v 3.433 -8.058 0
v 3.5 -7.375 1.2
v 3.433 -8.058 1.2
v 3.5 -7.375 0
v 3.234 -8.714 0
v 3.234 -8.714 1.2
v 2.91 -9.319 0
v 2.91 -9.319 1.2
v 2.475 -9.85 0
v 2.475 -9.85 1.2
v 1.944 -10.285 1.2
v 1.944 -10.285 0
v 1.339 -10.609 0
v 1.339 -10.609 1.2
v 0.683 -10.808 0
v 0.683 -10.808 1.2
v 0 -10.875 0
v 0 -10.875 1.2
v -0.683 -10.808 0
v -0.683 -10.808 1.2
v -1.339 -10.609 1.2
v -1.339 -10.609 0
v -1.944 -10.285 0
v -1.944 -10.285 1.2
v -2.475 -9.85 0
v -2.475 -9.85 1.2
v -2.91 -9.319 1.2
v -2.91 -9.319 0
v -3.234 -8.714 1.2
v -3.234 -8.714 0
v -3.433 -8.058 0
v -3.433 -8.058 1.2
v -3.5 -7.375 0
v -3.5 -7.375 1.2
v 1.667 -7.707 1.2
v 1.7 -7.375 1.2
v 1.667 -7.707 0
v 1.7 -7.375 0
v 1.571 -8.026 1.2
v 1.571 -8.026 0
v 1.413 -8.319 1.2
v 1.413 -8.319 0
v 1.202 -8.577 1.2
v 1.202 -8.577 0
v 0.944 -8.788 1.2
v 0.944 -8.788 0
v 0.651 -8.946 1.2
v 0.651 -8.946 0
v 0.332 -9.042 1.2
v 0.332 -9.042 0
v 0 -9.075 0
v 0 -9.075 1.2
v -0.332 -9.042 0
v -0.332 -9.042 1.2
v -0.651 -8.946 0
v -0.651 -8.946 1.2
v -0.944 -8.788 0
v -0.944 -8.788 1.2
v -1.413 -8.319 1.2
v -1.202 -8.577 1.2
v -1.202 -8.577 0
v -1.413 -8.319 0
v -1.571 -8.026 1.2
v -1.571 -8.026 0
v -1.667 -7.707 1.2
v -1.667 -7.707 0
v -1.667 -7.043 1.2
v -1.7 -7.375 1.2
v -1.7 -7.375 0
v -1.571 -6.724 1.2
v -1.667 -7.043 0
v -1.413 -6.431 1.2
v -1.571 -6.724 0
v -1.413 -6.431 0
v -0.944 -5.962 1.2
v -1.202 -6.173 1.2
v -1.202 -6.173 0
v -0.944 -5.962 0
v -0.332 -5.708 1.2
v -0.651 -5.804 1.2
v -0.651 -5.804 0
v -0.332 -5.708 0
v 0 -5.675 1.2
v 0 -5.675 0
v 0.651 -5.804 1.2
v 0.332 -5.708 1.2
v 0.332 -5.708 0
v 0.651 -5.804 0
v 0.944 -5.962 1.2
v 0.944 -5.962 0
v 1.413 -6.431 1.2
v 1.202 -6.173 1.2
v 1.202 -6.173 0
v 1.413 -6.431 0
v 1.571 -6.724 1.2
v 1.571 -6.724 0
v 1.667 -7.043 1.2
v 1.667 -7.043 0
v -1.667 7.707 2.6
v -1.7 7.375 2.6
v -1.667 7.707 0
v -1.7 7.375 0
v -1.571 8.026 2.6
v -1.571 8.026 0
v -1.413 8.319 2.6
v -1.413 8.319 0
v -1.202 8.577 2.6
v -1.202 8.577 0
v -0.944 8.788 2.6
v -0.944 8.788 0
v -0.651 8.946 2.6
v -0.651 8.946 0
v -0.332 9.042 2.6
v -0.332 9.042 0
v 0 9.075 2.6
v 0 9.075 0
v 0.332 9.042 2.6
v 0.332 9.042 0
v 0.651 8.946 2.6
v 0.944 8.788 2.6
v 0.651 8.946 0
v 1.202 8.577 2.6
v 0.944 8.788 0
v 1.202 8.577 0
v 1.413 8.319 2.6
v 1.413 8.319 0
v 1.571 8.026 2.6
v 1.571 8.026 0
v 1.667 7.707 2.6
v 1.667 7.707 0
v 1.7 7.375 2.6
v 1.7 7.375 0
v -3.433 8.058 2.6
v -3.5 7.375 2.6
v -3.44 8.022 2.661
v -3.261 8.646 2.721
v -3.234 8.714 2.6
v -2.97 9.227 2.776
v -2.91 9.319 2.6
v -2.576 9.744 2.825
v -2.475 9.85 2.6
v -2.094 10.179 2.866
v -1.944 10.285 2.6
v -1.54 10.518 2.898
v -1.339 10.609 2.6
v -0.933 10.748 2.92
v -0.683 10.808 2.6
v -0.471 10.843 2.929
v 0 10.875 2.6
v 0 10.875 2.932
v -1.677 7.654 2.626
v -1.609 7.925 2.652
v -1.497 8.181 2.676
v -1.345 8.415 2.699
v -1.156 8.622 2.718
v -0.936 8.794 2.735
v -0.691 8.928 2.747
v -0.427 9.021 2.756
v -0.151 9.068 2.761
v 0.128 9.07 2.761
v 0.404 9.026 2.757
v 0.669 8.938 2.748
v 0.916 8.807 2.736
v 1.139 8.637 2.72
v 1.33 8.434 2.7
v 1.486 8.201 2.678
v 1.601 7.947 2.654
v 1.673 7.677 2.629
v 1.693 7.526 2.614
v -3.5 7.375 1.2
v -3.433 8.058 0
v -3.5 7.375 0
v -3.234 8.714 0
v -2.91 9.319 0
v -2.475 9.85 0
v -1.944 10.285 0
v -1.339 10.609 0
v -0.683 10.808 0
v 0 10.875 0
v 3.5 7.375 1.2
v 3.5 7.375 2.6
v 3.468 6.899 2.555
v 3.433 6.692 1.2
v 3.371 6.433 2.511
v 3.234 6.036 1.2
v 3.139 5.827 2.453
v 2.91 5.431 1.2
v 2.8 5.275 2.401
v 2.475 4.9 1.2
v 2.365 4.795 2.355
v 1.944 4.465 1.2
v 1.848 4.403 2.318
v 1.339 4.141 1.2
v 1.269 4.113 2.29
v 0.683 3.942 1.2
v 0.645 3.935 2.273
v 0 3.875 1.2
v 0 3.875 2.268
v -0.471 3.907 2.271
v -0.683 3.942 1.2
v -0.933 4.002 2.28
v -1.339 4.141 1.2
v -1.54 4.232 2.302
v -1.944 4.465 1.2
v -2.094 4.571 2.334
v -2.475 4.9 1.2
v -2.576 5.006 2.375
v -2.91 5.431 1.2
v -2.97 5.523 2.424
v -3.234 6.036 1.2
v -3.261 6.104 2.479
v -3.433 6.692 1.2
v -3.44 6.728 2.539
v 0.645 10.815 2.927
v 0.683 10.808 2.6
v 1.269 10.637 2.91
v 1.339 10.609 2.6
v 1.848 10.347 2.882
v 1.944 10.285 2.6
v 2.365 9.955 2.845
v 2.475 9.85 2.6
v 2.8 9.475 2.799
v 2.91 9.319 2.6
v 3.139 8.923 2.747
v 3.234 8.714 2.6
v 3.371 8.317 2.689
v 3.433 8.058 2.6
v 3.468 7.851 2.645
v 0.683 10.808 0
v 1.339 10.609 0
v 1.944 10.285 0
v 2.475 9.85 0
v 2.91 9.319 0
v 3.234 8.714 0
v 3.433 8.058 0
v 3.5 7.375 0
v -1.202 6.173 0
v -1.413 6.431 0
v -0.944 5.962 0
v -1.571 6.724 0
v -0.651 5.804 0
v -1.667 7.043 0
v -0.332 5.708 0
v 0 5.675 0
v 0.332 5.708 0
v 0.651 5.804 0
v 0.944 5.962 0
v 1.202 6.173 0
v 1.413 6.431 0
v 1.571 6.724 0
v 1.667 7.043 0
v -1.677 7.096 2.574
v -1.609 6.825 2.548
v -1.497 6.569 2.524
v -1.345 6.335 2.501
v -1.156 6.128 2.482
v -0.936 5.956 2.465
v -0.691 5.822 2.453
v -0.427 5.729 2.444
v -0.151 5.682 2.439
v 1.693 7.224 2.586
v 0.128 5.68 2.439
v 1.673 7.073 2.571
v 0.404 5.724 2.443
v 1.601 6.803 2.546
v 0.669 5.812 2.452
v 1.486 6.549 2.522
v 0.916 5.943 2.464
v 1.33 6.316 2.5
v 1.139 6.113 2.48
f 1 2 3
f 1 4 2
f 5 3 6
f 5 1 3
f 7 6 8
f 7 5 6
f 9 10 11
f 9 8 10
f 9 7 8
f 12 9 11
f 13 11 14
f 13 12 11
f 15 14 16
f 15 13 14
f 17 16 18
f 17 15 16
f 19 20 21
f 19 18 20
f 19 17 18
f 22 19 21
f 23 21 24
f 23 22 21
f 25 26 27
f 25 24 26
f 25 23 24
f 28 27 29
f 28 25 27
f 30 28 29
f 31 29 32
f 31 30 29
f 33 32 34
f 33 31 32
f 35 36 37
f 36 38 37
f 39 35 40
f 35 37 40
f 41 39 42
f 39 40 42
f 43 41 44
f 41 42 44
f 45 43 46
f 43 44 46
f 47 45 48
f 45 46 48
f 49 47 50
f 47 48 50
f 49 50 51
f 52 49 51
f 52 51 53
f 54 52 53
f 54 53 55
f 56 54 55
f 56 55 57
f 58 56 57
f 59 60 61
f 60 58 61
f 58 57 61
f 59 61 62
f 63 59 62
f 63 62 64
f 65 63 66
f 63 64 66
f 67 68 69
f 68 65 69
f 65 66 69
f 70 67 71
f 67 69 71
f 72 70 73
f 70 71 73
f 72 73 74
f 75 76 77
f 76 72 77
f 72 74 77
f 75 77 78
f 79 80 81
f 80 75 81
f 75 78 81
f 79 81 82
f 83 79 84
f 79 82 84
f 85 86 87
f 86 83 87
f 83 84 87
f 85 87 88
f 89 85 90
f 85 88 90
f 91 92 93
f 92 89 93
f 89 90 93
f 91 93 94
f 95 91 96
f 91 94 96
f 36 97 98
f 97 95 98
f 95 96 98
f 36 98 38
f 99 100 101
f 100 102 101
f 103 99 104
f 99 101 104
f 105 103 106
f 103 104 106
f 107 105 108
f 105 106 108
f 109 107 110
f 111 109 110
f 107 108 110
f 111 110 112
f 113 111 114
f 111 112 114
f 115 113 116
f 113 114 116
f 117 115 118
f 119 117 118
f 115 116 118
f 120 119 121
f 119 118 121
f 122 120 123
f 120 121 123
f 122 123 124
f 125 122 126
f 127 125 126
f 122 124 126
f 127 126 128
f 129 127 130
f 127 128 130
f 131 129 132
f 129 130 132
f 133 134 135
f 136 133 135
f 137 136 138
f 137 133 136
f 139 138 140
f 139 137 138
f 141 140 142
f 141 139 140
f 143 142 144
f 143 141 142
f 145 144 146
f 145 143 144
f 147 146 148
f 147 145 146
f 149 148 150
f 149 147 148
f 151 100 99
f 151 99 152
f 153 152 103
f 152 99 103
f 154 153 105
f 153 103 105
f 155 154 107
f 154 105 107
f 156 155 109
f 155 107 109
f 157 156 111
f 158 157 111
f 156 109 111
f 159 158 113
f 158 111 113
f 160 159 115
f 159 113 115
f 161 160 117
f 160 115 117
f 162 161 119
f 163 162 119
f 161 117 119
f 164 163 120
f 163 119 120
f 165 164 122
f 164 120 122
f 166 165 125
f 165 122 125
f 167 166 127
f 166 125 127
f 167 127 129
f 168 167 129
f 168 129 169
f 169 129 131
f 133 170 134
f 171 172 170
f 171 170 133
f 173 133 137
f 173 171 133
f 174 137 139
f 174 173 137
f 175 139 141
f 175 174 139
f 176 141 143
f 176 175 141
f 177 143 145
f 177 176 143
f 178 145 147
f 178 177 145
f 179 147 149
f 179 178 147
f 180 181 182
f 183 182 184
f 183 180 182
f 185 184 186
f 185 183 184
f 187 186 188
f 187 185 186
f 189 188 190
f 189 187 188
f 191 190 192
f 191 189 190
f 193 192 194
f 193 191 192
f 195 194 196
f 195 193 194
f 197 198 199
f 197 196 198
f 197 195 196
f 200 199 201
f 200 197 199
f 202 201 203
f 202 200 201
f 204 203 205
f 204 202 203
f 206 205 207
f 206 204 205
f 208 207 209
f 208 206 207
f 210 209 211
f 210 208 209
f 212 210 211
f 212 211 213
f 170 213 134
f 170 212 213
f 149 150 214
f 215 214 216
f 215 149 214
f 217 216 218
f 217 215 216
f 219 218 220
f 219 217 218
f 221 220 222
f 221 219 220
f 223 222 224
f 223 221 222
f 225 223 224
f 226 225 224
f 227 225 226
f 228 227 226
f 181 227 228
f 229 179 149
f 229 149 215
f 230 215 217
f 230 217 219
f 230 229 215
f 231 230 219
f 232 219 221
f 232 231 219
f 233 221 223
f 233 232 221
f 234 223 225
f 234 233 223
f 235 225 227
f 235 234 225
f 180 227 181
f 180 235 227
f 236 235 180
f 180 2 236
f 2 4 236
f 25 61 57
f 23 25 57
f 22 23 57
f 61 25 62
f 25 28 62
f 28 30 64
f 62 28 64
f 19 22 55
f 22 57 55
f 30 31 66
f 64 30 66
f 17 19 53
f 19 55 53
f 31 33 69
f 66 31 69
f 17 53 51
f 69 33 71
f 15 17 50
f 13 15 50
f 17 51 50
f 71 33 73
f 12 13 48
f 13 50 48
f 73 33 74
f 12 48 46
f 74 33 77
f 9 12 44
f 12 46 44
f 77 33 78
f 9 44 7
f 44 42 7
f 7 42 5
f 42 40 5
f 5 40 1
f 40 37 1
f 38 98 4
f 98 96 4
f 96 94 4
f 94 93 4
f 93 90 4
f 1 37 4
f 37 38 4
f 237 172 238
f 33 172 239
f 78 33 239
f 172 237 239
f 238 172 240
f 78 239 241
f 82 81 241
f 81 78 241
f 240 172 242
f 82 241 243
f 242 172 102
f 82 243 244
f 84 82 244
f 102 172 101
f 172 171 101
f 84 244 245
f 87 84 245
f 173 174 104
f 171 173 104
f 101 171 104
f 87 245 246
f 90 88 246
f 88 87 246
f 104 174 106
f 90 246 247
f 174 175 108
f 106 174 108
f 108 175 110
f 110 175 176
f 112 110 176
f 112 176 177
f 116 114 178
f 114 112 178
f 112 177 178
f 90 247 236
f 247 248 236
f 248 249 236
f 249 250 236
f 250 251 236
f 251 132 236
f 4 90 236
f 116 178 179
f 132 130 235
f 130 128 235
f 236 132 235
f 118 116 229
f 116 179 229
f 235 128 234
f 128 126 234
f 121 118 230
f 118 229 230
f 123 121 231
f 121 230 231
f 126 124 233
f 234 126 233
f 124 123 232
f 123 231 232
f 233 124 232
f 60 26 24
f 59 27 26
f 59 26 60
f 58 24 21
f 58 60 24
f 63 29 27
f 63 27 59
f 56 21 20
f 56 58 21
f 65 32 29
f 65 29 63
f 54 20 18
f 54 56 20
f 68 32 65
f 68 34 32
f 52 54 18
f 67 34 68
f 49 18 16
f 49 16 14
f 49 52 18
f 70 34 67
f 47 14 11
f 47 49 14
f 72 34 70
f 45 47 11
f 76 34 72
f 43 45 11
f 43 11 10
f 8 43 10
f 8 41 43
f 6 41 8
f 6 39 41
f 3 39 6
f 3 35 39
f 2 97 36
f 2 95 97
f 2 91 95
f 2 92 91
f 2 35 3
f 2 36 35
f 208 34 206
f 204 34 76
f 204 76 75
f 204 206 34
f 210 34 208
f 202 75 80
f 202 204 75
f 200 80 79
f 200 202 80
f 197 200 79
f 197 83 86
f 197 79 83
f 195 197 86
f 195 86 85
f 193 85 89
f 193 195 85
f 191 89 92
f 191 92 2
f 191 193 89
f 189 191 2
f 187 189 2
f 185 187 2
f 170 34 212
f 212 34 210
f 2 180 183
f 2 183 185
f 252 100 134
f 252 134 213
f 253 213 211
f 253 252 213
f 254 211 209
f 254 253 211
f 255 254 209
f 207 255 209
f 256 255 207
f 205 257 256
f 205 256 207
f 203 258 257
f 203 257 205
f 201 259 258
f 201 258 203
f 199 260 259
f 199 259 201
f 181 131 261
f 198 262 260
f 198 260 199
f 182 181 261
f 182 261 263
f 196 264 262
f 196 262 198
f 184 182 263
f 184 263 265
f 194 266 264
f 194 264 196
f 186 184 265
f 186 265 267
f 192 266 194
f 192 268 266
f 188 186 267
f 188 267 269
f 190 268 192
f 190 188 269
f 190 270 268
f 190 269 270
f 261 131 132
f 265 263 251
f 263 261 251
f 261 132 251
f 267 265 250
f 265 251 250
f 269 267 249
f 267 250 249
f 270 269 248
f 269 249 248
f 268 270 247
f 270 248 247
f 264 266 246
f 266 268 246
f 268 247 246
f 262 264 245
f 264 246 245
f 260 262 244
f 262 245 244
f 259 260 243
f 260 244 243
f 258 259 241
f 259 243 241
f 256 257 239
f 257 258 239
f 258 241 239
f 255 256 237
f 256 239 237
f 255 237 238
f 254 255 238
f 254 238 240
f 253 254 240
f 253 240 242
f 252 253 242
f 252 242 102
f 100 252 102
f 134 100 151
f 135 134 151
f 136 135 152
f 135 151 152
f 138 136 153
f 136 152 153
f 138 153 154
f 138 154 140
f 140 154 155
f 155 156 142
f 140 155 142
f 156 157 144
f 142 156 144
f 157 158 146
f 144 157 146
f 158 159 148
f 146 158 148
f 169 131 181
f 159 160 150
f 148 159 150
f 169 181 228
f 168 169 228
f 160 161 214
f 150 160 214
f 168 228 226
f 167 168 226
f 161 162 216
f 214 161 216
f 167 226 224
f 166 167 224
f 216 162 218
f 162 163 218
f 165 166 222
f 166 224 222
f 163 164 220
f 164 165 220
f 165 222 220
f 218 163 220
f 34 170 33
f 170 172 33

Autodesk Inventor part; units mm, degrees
ref_plane "YZ Plane" through (0, 0, 0) normal (1, 0, 0) x (0, 1, 0)
ref_plane "XZ Plane" through (0, 0, 0) normal (0, 1, 0) x (-1, 0, 0)
ref_plane "XY Plane" through (0, 0, 0) normal (0, 0, 1) x (1, 0, 0)
sketch "Náčrt1" plane through (0, 0, 0) normal (0, 0, 1) x (1, 0, 0)
  line L0 (0, 7.375) -> (0, -7.375) construction
  line L1 (-3.5, 7.375) -> (-3.5, -7.375)
  line L2 (3.5, -7.375) -> (3.5, 7.375)
  arc A0 (3.5, 7.375) -> (-3.5, 7.375) centre (0, 7.375) ccw
  arc A1 (-3.5, -7.375) -> (3.5, -7.375) centre (0, -7.375) ccw
  circle A2 centre (0, 7.375) radius 1.7
  circle A3 centre (0, -7.375) radius 1.7
  circle A4 centre (0, 7.375) radius 3.5
  point P0 (0, 0)
  point P1 (0, 0)
  point P2 (-3.5, 7.375)
  point P3 (3.5, 7.375)
  dimension "d0" = 14.75
  dimension "d1" = 3.5
  dimension "d2" = 3.4
extrude "Vysunutí1" add sketch "Náčrt1" along normal blind 1.2
extrude "Vysunutí2" add sketch "Náčrt1" along normal blind 2.6 contours A0 A4
sketch "Náčrt4" plane through (3.5, -7.375, 0) normal (1, 0, 0) x (0, 0, -1)
  line L0 (-2.6, 13.05) -> (-2.6, 16.45) projected
  line L1 (-1.2, -1.7) -> (-1.2, 1.7) projected
  line L2 (-2.6, 14.75) -> (-1.2, 0)
  line L3 (-2.6, 18.25) -> (-2.6, 11.25) projected
  line L4 (0, 14.75) -> (0, 14.75) projected
  line L5 (0, 14.75) -> (-1.2, 14.75) projected
  line L6 (-1.2, 14.75) -> (-1.2, 14.75) projected
  line L7 (0, 14.75) -> (-1.2, 14.75) projected
  line L8 (-1.2, 11.25) -> (-2.6, 11.25) projected
  line L9 (-2.6, 14.75) -> (-2.9322, 18.25)
  line L10 (-2.6, 18.25) -> (-2.9322, 18.25)
  point P0 (0, 7.375)
  point P1 (-2.2678, 11.25)
extrude "Vysunutí3" cut sketch "Náčrt4" against normal through all contours L0 L2 L8 L3
extrude "Vysunutí4" add sketch "Náčrt4" against normal up to surface (7 mm away) contours L9 L10 L3 L0
sketch "Náčrt5" plane through (0, 0, 0) normal (0, 0, -1) x (-1, 0, 0)
  circle A0 centre (0, 7.375) radius 1.7 projected
  circle A1 centre (0, -7.375) radius 1.7 projected
  line L0 (-3.5, -7.375) -> (-3.5, 7.375) projected
  arc A2 (-3.5, -7.375) -> (3.5, -7.375) centre (0, -7.375) ccw projected
  line L1 (3.5, 7.375) -> (3.5, -7.375) projected
  arc A3 (3.5, 7.375) -> (-3.5, 7.375) centre (0, 7.375) ccw projected
  arc A4 (1.7, 7.375) -> (-1.7, 7.375) centre (0, 7.375) ccw projected
  line L2 (-1.7, 7.375) -> (1.7, 7.375) projected
  arc A5 (3.5, 7.375) -> (0, 10.875) centre (0, 7.375) ccw projected
  line L3 (3.5, 10.875) -> (3.5, 7.375) projected
  line L4 (0, 10.875) -> (3.5, 10.875) projected
  arc A6 (0, 10.875) -> (-3.5, 7.375) centre (0, 7.375) ccw projected
  line L5 (-3.5, 10.875) -> (0, 10.875) projected
  line L6 (-3.5, 7.375) -> (-3.5, 10.875) projected
  point P0 (0, 0)
  point P1 (3.5, 7.375)
  point P2 (0, 10.875)
  point P3 (0, 10.875)
  point P4 (-3.5, 7.375)
  point P5 (-1.7, 7.375)
extrude "Vysunutí5" cut sketch "Náčrt5" against normal through all contours L2 A0 | L6 L5 A3 | L4 L3 A3 picked at (0.5018, 7.6383)
properties part number "back qre flex holder"
